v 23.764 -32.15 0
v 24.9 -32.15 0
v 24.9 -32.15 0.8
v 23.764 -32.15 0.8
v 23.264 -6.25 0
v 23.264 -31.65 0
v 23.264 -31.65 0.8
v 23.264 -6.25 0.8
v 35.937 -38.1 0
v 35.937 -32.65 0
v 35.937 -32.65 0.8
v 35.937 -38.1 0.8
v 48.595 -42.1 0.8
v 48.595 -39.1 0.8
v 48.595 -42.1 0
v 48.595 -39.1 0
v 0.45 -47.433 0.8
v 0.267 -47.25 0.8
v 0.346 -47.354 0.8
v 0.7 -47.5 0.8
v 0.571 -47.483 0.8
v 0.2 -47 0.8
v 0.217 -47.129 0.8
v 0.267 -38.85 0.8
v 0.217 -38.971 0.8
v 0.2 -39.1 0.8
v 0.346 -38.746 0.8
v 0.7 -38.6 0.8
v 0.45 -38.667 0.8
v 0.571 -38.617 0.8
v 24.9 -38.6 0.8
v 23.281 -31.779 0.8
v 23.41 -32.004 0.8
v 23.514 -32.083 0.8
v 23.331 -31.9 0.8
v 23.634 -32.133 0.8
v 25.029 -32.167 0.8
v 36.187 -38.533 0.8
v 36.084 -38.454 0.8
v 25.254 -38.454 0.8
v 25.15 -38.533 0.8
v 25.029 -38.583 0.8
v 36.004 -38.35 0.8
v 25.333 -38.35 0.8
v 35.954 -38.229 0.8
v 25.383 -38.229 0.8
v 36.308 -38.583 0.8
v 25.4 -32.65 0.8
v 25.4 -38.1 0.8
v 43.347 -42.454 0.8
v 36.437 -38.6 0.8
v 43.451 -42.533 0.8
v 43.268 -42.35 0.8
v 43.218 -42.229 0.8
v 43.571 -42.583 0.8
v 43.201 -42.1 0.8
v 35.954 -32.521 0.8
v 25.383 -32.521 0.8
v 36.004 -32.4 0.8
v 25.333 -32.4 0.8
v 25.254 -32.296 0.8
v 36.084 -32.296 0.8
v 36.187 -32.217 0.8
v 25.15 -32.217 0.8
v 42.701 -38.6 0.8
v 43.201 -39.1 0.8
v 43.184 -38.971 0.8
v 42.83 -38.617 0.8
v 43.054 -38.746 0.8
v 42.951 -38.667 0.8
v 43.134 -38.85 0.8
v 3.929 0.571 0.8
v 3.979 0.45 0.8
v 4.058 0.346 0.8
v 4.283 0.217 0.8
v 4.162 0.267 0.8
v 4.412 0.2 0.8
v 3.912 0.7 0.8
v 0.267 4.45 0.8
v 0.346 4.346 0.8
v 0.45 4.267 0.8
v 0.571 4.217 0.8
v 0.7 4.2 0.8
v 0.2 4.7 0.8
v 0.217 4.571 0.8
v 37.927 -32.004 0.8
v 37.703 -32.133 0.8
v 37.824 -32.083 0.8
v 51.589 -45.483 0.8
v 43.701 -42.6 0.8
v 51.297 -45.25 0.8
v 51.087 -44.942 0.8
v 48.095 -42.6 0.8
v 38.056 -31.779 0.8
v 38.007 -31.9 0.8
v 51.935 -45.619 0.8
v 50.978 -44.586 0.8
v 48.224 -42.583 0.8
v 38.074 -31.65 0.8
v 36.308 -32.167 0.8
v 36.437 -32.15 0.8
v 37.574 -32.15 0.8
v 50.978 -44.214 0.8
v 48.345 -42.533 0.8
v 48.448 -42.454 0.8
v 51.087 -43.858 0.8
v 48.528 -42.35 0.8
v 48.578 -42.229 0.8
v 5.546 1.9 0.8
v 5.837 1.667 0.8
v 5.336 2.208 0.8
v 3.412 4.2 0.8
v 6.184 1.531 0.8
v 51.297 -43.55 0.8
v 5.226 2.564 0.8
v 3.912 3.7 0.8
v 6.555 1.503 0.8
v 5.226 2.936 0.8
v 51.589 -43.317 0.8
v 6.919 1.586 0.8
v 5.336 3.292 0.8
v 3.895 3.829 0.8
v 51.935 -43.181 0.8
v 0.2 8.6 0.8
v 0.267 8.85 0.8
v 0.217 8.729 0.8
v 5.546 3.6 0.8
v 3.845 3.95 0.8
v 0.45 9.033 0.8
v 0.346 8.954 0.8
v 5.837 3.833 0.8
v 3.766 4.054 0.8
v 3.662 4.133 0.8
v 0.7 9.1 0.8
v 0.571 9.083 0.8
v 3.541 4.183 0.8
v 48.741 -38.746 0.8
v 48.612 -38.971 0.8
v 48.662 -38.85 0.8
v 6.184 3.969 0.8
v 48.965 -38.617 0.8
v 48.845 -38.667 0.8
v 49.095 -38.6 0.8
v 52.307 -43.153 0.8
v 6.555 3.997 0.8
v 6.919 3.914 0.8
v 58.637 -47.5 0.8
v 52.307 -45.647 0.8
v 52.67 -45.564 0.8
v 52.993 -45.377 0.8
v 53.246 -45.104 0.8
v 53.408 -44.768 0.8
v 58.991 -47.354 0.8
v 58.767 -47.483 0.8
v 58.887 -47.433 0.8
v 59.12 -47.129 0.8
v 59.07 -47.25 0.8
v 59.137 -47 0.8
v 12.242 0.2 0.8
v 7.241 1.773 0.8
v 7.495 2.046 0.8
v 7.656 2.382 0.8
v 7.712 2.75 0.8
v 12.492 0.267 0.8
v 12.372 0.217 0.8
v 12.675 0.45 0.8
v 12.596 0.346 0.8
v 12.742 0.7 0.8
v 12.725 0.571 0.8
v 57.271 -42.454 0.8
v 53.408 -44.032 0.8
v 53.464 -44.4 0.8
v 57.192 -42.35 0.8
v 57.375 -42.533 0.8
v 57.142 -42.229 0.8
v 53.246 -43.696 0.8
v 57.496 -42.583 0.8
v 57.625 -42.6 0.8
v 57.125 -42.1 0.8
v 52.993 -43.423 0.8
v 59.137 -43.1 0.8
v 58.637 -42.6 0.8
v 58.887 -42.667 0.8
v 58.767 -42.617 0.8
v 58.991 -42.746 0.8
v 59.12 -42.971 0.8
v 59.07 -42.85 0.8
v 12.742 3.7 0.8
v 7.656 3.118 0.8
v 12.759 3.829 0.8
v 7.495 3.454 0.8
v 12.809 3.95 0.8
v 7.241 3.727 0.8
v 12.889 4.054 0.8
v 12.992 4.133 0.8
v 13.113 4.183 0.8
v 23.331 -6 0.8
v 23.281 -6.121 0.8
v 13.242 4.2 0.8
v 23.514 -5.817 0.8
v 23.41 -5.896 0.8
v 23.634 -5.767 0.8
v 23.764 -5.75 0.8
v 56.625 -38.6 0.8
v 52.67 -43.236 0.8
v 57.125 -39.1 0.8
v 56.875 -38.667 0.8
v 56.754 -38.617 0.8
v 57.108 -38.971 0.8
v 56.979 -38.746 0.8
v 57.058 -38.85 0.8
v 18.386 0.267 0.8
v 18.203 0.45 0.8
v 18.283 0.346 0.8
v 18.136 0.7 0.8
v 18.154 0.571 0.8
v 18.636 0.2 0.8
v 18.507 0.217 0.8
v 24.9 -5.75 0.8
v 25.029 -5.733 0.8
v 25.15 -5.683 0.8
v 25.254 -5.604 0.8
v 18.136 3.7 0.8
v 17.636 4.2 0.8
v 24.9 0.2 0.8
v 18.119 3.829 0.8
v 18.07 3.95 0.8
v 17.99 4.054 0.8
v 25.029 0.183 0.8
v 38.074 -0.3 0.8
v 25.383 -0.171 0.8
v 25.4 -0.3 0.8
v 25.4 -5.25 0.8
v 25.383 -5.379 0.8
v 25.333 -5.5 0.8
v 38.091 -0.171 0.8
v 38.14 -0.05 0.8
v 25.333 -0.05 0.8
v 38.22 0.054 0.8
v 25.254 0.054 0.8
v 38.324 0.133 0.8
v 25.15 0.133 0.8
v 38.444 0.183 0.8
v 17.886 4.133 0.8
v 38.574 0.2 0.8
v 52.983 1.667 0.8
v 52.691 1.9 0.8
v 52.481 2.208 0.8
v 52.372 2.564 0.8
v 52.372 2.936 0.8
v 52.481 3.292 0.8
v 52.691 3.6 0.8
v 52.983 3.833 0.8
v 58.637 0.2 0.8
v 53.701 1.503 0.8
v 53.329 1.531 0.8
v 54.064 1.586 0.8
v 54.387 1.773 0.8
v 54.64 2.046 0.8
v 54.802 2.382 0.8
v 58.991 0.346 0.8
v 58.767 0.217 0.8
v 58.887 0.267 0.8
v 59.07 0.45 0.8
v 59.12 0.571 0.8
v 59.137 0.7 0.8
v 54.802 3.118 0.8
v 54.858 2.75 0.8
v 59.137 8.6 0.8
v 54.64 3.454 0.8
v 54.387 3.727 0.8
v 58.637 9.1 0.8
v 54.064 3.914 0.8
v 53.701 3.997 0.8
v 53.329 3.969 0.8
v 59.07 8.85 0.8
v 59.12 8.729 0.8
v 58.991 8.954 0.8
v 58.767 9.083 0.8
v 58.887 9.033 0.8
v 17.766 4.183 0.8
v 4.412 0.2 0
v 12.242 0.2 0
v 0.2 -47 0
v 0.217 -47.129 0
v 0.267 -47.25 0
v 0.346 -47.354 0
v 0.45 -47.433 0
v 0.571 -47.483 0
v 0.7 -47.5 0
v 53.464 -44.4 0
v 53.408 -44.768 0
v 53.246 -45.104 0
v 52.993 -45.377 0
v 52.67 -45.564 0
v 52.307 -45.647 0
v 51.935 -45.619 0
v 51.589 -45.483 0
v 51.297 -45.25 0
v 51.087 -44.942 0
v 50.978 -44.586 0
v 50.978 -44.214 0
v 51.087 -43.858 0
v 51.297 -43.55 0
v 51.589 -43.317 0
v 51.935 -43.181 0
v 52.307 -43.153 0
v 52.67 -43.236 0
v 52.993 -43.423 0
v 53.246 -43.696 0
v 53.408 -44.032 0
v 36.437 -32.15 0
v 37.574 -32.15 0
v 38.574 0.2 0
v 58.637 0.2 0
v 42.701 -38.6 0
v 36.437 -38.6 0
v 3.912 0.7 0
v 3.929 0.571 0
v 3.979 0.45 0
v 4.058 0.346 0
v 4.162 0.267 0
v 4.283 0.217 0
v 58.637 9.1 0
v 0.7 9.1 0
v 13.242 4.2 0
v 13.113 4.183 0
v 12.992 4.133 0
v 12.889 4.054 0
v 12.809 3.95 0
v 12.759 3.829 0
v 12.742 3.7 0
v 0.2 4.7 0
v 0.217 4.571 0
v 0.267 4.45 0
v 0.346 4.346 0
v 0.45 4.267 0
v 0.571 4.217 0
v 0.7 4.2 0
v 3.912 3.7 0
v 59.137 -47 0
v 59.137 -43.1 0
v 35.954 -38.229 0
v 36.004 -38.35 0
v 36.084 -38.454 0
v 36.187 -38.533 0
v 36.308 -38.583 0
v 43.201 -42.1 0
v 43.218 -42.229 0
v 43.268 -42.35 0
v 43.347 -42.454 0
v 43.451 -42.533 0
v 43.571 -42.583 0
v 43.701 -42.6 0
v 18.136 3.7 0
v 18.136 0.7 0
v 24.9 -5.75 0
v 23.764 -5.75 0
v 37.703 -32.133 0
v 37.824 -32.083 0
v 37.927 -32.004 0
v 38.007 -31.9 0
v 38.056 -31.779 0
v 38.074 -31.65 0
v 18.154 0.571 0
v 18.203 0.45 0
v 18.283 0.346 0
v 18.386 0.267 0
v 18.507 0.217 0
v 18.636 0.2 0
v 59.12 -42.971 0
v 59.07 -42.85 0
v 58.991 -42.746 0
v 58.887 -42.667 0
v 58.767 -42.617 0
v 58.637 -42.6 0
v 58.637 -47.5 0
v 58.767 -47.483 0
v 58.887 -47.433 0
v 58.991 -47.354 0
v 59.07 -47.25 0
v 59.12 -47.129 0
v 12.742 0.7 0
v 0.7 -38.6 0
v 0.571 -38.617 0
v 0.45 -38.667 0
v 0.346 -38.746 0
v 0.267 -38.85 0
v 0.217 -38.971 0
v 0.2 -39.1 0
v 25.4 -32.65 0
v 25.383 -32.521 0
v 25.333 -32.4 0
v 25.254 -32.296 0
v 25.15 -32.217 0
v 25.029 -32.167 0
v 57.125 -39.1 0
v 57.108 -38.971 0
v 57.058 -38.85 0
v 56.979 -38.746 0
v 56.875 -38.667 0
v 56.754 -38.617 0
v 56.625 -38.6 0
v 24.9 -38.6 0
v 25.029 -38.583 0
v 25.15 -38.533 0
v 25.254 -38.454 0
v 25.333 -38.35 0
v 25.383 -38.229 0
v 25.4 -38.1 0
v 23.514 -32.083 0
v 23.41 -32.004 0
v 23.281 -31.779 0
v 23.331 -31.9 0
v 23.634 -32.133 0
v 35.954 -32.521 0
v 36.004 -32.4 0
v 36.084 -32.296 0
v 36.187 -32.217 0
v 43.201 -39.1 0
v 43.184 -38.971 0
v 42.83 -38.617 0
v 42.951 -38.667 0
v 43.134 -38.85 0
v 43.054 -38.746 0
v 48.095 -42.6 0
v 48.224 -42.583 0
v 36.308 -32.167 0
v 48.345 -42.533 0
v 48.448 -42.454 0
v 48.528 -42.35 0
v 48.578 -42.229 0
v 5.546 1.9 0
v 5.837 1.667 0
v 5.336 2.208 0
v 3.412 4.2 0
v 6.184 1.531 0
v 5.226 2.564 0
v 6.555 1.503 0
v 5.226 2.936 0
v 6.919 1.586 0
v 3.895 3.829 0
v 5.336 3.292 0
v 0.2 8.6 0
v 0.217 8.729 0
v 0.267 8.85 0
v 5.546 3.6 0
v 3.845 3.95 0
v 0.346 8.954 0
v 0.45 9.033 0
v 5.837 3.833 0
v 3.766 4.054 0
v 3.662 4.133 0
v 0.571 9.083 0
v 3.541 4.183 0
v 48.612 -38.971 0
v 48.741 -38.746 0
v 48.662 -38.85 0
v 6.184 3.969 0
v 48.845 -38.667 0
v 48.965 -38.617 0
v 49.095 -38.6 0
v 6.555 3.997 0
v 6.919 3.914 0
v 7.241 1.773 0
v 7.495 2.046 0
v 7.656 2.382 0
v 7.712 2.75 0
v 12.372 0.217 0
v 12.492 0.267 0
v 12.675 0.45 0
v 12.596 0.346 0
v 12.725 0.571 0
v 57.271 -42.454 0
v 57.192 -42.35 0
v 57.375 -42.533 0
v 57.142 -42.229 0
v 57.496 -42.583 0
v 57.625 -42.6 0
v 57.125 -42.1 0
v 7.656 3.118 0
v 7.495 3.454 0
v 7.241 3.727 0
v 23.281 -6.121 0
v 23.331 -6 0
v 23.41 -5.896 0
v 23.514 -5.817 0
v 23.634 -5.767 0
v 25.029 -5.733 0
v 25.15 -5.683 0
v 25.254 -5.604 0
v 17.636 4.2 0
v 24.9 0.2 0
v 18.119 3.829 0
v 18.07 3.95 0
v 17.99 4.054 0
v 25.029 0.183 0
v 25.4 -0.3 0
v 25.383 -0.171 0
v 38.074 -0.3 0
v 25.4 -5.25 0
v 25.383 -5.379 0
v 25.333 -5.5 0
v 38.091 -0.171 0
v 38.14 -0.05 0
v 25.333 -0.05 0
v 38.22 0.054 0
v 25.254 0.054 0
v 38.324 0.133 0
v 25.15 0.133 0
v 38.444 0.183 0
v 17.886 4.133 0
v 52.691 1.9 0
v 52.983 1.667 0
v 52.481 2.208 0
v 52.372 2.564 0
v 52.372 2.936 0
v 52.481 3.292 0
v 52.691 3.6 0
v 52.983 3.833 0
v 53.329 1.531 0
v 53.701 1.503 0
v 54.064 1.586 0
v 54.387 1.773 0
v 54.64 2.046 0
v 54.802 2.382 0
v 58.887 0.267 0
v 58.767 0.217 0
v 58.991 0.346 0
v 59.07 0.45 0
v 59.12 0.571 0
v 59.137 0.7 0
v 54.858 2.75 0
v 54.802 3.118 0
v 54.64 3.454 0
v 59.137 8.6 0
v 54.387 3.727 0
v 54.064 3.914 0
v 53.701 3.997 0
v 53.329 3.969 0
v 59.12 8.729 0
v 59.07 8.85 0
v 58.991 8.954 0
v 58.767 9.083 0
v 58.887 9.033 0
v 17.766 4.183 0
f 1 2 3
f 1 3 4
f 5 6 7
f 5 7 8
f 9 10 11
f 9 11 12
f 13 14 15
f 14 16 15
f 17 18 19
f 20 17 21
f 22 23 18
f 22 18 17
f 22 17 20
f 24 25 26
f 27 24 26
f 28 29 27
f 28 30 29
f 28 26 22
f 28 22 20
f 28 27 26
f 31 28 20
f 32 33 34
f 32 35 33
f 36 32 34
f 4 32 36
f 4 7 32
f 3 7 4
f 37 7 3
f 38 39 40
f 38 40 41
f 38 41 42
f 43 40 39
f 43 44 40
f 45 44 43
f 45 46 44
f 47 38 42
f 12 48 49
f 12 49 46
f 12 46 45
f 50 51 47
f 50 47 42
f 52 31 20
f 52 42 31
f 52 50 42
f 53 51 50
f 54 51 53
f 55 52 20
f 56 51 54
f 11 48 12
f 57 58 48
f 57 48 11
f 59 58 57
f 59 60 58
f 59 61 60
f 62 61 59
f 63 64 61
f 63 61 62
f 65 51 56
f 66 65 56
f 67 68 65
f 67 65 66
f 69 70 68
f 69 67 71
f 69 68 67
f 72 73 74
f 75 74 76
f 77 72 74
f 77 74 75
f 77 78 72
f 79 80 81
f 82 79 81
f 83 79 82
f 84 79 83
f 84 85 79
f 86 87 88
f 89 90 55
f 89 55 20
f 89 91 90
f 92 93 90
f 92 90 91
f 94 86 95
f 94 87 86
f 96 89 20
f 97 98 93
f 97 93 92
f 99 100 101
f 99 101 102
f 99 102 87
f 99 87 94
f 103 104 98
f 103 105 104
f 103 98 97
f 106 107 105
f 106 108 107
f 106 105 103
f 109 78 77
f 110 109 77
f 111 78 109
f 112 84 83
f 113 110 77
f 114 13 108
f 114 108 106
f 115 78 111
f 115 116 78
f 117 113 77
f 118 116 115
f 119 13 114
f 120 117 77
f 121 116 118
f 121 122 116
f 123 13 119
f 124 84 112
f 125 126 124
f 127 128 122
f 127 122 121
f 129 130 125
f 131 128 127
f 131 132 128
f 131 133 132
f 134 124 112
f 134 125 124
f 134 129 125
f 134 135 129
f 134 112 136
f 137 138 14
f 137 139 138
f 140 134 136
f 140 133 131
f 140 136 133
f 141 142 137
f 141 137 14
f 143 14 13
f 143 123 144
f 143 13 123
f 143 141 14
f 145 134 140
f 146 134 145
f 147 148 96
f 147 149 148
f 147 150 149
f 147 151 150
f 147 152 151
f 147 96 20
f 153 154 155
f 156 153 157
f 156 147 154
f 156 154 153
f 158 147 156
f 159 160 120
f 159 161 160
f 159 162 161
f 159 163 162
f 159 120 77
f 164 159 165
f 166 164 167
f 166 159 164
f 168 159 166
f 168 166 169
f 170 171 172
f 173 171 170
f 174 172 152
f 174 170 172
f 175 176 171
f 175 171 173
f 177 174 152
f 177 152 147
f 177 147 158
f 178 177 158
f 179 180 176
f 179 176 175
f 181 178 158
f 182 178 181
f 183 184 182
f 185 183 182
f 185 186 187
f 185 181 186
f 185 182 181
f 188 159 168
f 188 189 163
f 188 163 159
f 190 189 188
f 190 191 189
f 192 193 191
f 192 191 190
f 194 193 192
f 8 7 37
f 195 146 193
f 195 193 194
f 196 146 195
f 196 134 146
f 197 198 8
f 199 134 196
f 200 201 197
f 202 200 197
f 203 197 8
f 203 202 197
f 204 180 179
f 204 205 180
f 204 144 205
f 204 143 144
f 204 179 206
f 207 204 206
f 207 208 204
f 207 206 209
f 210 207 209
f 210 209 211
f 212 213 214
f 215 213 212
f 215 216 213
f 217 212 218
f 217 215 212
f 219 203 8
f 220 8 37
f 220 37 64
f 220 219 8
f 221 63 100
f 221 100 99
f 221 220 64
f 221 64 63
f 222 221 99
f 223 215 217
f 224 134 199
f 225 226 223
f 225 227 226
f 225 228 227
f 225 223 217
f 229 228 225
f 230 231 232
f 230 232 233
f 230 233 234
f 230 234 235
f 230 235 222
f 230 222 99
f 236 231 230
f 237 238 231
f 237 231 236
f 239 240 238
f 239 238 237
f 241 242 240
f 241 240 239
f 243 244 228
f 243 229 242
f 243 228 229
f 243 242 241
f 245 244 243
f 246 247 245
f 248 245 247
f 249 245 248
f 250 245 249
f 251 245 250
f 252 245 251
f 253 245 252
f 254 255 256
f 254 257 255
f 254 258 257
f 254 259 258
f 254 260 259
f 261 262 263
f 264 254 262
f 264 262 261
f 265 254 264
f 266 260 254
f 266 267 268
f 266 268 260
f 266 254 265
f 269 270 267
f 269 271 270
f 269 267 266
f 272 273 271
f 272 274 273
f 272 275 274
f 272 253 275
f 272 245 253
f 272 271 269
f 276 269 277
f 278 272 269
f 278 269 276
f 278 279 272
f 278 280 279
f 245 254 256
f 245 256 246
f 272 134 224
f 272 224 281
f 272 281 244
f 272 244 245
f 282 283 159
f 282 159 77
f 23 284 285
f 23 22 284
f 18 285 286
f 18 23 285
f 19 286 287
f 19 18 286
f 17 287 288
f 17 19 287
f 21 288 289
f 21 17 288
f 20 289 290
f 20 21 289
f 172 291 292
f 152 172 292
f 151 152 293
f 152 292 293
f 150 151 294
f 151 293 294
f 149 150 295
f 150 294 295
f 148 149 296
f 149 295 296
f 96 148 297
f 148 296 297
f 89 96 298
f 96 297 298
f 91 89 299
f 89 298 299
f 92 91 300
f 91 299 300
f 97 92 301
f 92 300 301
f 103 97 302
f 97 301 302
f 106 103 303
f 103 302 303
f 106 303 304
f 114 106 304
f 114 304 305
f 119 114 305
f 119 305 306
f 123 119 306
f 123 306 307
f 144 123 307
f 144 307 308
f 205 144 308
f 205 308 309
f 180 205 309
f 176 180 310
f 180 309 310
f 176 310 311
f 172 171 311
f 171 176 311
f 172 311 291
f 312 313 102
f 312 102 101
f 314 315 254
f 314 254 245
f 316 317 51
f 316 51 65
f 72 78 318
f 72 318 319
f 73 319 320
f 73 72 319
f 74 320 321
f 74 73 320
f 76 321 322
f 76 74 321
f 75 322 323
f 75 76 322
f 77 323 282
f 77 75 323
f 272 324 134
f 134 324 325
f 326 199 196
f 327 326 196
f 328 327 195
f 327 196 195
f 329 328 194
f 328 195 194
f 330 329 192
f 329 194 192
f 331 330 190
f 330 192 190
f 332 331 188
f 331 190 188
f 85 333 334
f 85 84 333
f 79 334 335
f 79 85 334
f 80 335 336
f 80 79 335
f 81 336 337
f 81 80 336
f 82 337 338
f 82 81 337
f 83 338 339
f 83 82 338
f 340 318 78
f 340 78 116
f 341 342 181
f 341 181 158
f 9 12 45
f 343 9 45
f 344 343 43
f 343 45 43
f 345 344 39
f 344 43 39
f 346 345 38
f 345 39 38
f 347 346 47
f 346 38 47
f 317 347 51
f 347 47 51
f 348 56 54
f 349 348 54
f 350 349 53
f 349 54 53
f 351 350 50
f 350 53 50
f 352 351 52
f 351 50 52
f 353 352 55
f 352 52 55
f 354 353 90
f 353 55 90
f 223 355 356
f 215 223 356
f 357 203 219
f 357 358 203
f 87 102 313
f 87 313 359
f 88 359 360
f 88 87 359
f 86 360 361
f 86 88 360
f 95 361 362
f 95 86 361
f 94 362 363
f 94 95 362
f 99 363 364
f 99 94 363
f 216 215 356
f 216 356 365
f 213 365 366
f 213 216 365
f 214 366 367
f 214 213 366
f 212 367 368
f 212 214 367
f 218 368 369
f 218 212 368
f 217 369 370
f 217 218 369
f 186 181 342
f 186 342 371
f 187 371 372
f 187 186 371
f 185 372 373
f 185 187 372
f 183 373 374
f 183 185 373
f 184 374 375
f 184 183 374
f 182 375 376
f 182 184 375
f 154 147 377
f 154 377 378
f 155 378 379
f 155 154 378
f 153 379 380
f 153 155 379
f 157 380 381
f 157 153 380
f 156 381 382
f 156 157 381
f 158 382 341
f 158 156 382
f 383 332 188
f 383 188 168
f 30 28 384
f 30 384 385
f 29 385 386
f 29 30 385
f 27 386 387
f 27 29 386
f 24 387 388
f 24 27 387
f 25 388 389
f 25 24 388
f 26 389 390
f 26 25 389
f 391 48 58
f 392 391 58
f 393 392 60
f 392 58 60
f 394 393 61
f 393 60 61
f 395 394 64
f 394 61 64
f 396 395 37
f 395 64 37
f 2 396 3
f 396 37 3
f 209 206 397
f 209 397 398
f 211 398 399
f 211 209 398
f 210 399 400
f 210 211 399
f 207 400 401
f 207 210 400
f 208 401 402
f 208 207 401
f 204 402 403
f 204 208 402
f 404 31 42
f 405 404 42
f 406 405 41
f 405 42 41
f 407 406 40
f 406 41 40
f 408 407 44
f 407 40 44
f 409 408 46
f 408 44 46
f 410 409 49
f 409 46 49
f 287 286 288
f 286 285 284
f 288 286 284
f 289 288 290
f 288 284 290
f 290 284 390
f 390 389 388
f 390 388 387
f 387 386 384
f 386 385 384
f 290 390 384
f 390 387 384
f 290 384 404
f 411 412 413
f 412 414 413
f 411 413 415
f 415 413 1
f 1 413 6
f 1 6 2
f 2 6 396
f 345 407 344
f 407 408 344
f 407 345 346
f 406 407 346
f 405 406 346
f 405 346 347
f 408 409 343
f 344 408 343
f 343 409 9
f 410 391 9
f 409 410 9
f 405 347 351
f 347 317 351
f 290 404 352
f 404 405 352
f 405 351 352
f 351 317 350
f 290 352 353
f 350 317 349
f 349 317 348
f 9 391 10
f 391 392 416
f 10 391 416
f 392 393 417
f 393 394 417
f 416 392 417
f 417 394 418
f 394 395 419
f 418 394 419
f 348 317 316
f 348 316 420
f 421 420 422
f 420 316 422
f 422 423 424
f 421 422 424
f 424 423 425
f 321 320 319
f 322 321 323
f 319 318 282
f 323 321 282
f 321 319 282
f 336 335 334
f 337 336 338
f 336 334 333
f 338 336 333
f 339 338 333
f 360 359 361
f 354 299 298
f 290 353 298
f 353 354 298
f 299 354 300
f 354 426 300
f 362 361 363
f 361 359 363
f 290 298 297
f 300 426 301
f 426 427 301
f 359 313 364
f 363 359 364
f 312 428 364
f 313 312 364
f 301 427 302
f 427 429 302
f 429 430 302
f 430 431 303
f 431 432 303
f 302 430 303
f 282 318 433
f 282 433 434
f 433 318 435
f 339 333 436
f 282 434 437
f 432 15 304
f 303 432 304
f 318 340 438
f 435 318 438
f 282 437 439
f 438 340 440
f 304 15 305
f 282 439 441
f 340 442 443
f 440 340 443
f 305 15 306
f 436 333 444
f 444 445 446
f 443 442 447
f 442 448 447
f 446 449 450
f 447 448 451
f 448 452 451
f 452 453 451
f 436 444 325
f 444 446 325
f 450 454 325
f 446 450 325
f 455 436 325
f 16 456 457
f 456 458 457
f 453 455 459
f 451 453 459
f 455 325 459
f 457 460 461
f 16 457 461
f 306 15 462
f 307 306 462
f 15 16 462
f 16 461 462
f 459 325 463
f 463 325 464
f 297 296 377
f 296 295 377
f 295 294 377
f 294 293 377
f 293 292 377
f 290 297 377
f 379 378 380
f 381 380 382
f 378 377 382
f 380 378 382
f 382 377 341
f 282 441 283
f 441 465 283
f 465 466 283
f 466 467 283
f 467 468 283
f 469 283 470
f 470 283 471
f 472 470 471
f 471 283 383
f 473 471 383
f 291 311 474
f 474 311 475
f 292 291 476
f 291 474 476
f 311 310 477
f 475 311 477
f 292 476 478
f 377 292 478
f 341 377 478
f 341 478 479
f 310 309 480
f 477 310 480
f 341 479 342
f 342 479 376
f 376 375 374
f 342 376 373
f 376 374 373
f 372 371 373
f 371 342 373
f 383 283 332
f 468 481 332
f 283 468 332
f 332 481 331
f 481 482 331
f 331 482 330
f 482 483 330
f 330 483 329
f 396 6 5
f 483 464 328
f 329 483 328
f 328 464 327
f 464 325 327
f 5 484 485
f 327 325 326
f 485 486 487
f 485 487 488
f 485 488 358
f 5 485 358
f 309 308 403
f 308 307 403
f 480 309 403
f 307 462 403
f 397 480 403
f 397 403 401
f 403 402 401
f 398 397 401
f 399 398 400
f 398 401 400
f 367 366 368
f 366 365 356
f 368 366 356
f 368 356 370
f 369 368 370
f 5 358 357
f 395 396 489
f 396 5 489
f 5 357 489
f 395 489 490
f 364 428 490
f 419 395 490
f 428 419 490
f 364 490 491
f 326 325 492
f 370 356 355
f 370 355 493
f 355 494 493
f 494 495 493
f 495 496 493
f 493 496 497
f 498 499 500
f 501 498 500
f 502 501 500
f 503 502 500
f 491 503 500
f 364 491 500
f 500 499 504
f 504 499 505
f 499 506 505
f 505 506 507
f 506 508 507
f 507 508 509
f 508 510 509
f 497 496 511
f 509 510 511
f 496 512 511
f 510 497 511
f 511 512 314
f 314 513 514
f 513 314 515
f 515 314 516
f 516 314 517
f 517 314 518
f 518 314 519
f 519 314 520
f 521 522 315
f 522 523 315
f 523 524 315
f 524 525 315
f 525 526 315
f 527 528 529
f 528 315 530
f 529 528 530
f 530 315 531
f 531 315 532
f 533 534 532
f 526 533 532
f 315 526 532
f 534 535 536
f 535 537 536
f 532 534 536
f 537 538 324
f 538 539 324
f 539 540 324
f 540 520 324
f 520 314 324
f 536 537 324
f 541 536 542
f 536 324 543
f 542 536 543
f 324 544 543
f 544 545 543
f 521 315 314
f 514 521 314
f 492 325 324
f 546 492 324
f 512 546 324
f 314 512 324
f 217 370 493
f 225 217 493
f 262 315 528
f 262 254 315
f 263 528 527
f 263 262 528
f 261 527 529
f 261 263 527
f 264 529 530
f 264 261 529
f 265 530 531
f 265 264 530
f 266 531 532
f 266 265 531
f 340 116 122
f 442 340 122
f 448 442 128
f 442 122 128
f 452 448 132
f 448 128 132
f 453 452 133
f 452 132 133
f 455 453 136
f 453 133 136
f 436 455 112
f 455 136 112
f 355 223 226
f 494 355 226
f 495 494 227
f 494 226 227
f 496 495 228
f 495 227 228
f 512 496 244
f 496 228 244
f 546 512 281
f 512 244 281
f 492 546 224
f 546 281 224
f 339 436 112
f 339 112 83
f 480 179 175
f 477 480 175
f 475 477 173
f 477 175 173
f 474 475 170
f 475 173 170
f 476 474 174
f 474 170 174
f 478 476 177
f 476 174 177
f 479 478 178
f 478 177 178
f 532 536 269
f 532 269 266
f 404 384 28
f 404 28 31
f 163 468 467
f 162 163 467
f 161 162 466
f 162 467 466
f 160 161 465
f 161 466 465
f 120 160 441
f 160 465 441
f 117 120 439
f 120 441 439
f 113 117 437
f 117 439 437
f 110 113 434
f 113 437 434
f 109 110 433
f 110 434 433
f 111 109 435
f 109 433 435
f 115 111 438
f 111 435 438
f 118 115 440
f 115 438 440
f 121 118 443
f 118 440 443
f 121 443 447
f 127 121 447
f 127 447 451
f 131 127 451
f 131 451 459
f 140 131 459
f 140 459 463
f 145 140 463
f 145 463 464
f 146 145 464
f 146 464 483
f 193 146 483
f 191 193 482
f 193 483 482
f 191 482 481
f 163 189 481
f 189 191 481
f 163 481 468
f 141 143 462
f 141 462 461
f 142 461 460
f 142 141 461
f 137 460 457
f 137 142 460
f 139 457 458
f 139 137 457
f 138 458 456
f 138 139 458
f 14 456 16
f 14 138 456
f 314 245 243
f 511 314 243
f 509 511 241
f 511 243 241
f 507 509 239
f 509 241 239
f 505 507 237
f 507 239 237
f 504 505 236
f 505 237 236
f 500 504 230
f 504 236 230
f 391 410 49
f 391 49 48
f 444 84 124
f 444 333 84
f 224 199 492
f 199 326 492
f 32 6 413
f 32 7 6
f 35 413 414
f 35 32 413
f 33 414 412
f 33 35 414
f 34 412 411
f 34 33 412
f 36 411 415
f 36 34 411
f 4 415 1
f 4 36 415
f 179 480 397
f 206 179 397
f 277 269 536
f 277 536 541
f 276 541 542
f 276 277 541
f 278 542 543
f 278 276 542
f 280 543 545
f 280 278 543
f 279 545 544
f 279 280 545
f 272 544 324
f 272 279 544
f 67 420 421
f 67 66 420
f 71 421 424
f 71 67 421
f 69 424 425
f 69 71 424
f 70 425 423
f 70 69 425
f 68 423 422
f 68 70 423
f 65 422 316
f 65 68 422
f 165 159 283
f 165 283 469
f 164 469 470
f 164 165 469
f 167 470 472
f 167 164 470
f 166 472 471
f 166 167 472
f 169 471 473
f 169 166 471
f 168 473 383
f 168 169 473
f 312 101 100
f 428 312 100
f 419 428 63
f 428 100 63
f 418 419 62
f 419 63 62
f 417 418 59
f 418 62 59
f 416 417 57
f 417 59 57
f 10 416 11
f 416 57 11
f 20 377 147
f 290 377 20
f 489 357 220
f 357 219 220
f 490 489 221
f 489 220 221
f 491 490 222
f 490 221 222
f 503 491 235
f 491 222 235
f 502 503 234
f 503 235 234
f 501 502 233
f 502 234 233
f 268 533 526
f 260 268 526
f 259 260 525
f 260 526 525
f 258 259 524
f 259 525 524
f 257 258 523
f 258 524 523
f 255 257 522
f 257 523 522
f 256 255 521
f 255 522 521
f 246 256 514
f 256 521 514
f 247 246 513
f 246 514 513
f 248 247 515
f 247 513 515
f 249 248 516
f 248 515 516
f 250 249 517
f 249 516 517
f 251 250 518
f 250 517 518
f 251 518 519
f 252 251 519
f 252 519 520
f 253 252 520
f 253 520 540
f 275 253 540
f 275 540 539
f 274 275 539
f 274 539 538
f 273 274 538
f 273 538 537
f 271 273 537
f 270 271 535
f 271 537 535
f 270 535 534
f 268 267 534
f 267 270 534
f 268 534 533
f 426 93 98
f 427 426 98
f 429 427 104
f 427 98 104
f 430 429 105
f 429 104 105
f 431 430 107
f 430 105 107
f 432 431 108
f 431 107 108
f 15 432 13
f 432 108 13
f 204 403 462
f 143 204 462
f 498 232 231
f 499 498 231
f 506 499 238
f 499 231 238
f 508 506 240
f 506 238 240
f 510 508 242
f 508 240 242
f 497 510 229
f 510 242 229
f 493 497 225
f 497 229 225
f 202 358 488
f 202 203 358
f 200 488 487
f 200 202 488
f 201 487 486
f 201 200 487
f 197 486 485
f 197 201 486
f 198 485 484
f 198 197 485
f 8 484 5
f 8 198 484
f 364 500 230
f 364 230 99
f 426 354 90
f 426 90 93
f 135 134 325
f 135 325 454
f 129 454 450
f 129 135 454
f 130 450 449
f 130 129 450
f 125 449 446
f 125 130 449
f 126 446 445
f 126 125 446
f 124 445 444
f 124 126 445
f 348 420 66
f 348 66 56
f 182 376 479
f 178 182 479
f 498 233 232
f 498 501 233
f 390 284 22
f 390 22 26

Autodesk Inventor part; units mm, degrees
ref_plane "YZ Plane" through (0, 0, 0) normal (1, 0, 0) x (0, 1, 0)
ref_plane "XZ Plane" through (0, 0, 0) normal (0, 1, 0) x (-1, 0, 0)
ref_plane "XY Plane" through (0, 0, 0) normal (0, 0, 1) x (1, 0, 0)
sketch "Sketch1" plane through (0, 0, 0) normal (0, 0, 1) x (1, 0, 0)
  line L0 (13.7023, 4) -> (22.3525, 4) projected
  line L1 (22.3525, 0) -> (59.3371, 0) projected
  line L2 (59.3371, 0) -> (59.3371, 9.3) projected
  line L3 (59.3371, 9.3) -> (0, 9.3) projected
  line L4 (0, 4) -> (0, 9.3) projected
  line L5 (2.4551, 0) -> (13.7023, 0) projected
  line L6 (0, -38.4) -> (39.318, -38.4) projected
  line L7 (0, -38.4) -> (0, -47.7) projected
  line L8 (0, -47.7) -> (59.3371, -47.7) projected
  line L9 (59.3371, -42.4) -> (59.3371, -47.7) projected
  line L10 (59.3371, -42.4) -> (58.882, -42.4) projected
  line L11 (58.882, -42.4) -> (58.882, -38.4) projected
  line L12 (47.6348, -38.4) -> (58.882, -38.4) projected
  line L13 (47.6348, -42.4) -> (39.318, -42.4) projected
  line L14 (39.0735, -33.15) -> (39.0735, -5.25)
  line L15 (39.0735, -5.25) -> (39.9371, -5.25)
  line L16 (39.9371, -5.25) -> (39.9371, -33.15)
  line L17 (39.9371, -33.15) -> (39.0735, -33.15)
  line L18 (22.2636, -5.25) -> (22.2636, -33.15)
  line L19 (22.2636, -33.15) -> (21.4, -33.15)
  line L20 (21.4, -33.15) -> (21.4, -5.25)
  line L21 (21.4, -5.25) -> (22.2636, -5.25)
  line L22 (21.4, 0) -> (21.4, -38.4)
  line L23 (39.9371, -38.4) -> (39.9371, 0)
  line L24 (39.9371, 0) -> (62.3371, 0)
  line L25 (59.1371, 9.1) -> (59.1371, 0.2)
  line L26 (59.1371, 0.2) -> (38.0735, 0.2)
  line L27 (38.0735, 0.2) -> (38.0735, -6.25)
  line L28 (38.0735, -6.25) -> (38.0735, -6.25)
  line L29 (38.0735, -6.25) -> (38.0735, -32.15)
  line L30 (35.9371, -32.15) -> (35.9371, -38.6)
  line L31 (59.1371, -42.6) -> (59.1371, -47.5)
  line L32 (59.1371, -47.5) -> (46.1371, -47.5)
  line L33 (0.2, -47.5) -> (0.2, -38.6)
  line L34 (0.2, -38.6) -> (25.4, -38.6)
  line L35 (25.4, -38.6) -> (25.4, -32.15)
  line L36 (25.4, -32.15) -> (23.2636, -32.15)
  line L37 (23.2636, -32.15) -> (23.2636, -5.75)
  line L38 (23.2636, -5.75) -> (25.4, -5.75)
  line L39 (25.4, -5.75) -> (25.4, 0.2)
  line L40 (0.2, 4.2) -> (0.2, 8.5299)
  line L41 (38.0735, -32.15) -> (35.9371, -32.15)
  line L42 (12.7424, 4.2) -> (12.7424, 0.2)
  line L43 (12.7424, 0.2) -> (3.912, 0.2)
  line L44 (3.912, 0.2) -> (3.912, 4.2)
  line L45 (3.912, 4.2) -> (0.2, 4.2)
  line L46 (59.1371, -42.6) -> (57.125, -42.6)
  line L47 (57.125, -42.6) -> (57.125, -38.6)
  line L48 (57.125, -38.6) -> (48.5947, -38.6)
  line L49 (48.5947, -38.6) -> (48.5947, -42.6)
  line L50 (39.318, -42.4) -> (39.318, -38.4) projected
  line L51 (47.6348, -38.4) -> (47.6348, -42.4) projected
  line L52 (22.3525, 4) -> (22.3525, 0) projected
  spline S0 degree 2 poles (41.0471, 11.3) (40.5342, 11.2191) (40.0213, 11.3) knots 0 0 0 0.102903 0.102903 0.102903 weights 1 1.01269 1 projected
  line L53 (0, 11.3) -> (40.0213, 11.3) projected
  line L54 (0, 9.3) -> (0, 11.3) projected
  line L55 (0, 9.3) -> (46.3371, 9.3) projected
  line L56 (46.3371, 9.3) -> (46.3371, 11.3) projected
  line L57 (41.0471, 11.3) -> (46.3371, 11.3) projected
  spline S1 degree 2 poles (20.1962, -49.7) (20.5821, -49.6542) (20.9681, -49.7) knots 0 0 0 0.077319 0.077319 0.077319 weights 1 1.007125 1 projected
  line L58 (46.3371, -49.7) -> (20.9681, -49.7) projected
  line L59 (46.3371, -47.7) -> (46.3371, -49.7) projected
  line L60 (0, -47.7) -> (46.3371, -47.7) projected
  line L61 (0, -47.7) -> (0, -49.7) projected
  line L62 (20.1962, -49.7) -> (0, -49.7) projected
  line L63 (46.1371, -47.5) -> (0.2, -47.5)
  line L64 (46.1371, -47.5) -> (46.1371, -47.5)
  line L65 (46.1371, 9.1) -> (59.1371, 9.1)
  line L66 (46.1371, 9.1) -> (46.1371, 9.1)
  line L67 (46.1371, 9.1) -> (0.2, 9.1)
  line L68 (0.2, 9.1) -> (0.2, 8.5299)
  line L69 (3.712, 4) -> (3.712, 0)
  line L70 (12.9424, 0) -> (12.9424, 4)
  line L71 (17.9365, 4) -> (17.9365, 0)
  line L72 (12.7424, 4.2) -> (18.1365, 4.2)
  line L73 (18.1365, 4.2) -> (18.1365, 0.2)
  line L74 (18.1365, 0.2) -> (25.4, 0.2)
  line L75 (43.4006, -42.4) -> (43.4006, -38.4)
  line L76 (48.3947, -38.4) -> (48.3947, -42.4)
  line L77 (57.625, -42.4) -> (57.625, -38.4)
  line L78 (35.9371, -38.6) -> (43.2006, -38.6)
  line L79 (43.2006, -38.6) -> (43.2006, -42.6)
  line L80 (43.2006, -42.6) -> (48.5947, -42.6)
  circle A0 centre (6.462, 2.75) radius 1.0065 construction
  circle A1 centre (6.462, 2.75) radius 1.25
  circle A2 centre (53.6076, 2.75) radius 1.0065 construction
  circle A3 centre (53.6076, 2.75) radius 1.25
  circle A4 centre (52.2136, -44.4) radius 1.0065 construction
  circle A5 centre (52.2136, -44.4) radius 1.25
  point P0 (0, 0)
  point P1 (38.0735, 0)
  point P2 (35.9371, -38.4)
  point P3 (52.2136, -44.4)
  dimension "d1" = 0.2
  dimension "d3" = 0.2
  dimension "d5" = 0.2
  dimension "d7" = 0.2
  dimension "d8" = 0.2
  dimension "d10" = 0.2
  dimension "d11" = 0.2
  dimension "d16" = 1
  dimension "d17" = 1
  dimension "d18" = 4
  dimension "d19" = 0.5
  dimension "d20" = 1
  dimension "d21" = 1
  dimension "d22" = 1
  dimension "d23" = 1.8636
  dimension "d24" = 4
  dimension "d25" = 4
  dimension "d35" = 0.2
  dimension "d40" = 0.2
  dimension "d42" = 0.2
  dimension "d44" = 0.2
  dimension "d47" = 0.2
  dimension "d48" = 0.2
  dimension "d50" = 0
  dimension "d51" = 0.2
  dimension "d52" = 0.2
  dimension "d53" = 0.2
  dimension "d54" = 0.2
  dimension "d55" = 0.2
  dimension "d56" = 0.2
  dimension "d57" = 0.2
  dimension "d59" = 0.2
  dimension "d60" = 0.2
  dimension "d61" = 0.2
  dimension "d62" = 0.5
  dimension "d63" = 0.2
  dimension "d64" = 0.2
  dimension "d65" = 2.5
  dimension "d66" = 2.5
  dimension "d67" = 2.5
extrude "Extrusion1" add sketch "Sketch1" along normal blind 0.8 contours L73 L72 L42 L43 L44 L45 L40 L68 L67 L65 L25 L26 L27 L1 L39 L74 L52 L0 | L0 L52 L74 L73 | L1 L27 L29 L41 L30 L6 L35 L36 L37 L38 L39 | L30 L78 L50 L13 L79 L80 L49 L48 L47 L46 L31 L32 L63 L33 L34 L35 L6 | L78 L79 L13 L50
fillet "Fillet1" radius 0.5 30 edges at (59.1371, -47.5, 0.4) (59.1371, -42.6, 0.4) (0.2, -38.6, 0.4) (25.4, -38.6, 0.4) (25.4, -32.15, 0.4) (23.2636, -32.15, 0.4) (23.2636, -5.75, 0.4) (25.4, -5.75, 0.4) (25.4, 0.2, 0.4) (0.2, 4.2, 0.4) (59.1371, 9.1, 0.4) (59.1371, 0.2, 0.4) (38.0735, 0.2, 0.4) (38.0735, -32.15, 0.4) (35.9371, -32.15, 0.4) (35.9371, -38.6, 0.4) (3.912, 4.2, 0.4) (3.912, 0.2, 0.4) (12.7424, 4.2, 0.4) (12.7424, 0.2, 0.4) (48.5947, -42.6, 0.4) (48.5947, -38.6, 0.4) (57.125, -38.6, 0.4) (57.125, -42.6, 0.4) (0.2, -47.5, 0.4) (0.2, 9.1, 0.4) (43.2006, -38.6, 0.4) (18.1365, 4.2, 0.4) (18.1365, 0.2, 0.4) (43.2006, -42.6, 0.4)
equation "\"d5\" = d1"
equation "\"d7\" = d1"
equation "\"d8\" = d1"
equation "\"d10\" = d1"
equation "\"d40\" = d1"
properties part number "PCB_InterfaceBoard"
